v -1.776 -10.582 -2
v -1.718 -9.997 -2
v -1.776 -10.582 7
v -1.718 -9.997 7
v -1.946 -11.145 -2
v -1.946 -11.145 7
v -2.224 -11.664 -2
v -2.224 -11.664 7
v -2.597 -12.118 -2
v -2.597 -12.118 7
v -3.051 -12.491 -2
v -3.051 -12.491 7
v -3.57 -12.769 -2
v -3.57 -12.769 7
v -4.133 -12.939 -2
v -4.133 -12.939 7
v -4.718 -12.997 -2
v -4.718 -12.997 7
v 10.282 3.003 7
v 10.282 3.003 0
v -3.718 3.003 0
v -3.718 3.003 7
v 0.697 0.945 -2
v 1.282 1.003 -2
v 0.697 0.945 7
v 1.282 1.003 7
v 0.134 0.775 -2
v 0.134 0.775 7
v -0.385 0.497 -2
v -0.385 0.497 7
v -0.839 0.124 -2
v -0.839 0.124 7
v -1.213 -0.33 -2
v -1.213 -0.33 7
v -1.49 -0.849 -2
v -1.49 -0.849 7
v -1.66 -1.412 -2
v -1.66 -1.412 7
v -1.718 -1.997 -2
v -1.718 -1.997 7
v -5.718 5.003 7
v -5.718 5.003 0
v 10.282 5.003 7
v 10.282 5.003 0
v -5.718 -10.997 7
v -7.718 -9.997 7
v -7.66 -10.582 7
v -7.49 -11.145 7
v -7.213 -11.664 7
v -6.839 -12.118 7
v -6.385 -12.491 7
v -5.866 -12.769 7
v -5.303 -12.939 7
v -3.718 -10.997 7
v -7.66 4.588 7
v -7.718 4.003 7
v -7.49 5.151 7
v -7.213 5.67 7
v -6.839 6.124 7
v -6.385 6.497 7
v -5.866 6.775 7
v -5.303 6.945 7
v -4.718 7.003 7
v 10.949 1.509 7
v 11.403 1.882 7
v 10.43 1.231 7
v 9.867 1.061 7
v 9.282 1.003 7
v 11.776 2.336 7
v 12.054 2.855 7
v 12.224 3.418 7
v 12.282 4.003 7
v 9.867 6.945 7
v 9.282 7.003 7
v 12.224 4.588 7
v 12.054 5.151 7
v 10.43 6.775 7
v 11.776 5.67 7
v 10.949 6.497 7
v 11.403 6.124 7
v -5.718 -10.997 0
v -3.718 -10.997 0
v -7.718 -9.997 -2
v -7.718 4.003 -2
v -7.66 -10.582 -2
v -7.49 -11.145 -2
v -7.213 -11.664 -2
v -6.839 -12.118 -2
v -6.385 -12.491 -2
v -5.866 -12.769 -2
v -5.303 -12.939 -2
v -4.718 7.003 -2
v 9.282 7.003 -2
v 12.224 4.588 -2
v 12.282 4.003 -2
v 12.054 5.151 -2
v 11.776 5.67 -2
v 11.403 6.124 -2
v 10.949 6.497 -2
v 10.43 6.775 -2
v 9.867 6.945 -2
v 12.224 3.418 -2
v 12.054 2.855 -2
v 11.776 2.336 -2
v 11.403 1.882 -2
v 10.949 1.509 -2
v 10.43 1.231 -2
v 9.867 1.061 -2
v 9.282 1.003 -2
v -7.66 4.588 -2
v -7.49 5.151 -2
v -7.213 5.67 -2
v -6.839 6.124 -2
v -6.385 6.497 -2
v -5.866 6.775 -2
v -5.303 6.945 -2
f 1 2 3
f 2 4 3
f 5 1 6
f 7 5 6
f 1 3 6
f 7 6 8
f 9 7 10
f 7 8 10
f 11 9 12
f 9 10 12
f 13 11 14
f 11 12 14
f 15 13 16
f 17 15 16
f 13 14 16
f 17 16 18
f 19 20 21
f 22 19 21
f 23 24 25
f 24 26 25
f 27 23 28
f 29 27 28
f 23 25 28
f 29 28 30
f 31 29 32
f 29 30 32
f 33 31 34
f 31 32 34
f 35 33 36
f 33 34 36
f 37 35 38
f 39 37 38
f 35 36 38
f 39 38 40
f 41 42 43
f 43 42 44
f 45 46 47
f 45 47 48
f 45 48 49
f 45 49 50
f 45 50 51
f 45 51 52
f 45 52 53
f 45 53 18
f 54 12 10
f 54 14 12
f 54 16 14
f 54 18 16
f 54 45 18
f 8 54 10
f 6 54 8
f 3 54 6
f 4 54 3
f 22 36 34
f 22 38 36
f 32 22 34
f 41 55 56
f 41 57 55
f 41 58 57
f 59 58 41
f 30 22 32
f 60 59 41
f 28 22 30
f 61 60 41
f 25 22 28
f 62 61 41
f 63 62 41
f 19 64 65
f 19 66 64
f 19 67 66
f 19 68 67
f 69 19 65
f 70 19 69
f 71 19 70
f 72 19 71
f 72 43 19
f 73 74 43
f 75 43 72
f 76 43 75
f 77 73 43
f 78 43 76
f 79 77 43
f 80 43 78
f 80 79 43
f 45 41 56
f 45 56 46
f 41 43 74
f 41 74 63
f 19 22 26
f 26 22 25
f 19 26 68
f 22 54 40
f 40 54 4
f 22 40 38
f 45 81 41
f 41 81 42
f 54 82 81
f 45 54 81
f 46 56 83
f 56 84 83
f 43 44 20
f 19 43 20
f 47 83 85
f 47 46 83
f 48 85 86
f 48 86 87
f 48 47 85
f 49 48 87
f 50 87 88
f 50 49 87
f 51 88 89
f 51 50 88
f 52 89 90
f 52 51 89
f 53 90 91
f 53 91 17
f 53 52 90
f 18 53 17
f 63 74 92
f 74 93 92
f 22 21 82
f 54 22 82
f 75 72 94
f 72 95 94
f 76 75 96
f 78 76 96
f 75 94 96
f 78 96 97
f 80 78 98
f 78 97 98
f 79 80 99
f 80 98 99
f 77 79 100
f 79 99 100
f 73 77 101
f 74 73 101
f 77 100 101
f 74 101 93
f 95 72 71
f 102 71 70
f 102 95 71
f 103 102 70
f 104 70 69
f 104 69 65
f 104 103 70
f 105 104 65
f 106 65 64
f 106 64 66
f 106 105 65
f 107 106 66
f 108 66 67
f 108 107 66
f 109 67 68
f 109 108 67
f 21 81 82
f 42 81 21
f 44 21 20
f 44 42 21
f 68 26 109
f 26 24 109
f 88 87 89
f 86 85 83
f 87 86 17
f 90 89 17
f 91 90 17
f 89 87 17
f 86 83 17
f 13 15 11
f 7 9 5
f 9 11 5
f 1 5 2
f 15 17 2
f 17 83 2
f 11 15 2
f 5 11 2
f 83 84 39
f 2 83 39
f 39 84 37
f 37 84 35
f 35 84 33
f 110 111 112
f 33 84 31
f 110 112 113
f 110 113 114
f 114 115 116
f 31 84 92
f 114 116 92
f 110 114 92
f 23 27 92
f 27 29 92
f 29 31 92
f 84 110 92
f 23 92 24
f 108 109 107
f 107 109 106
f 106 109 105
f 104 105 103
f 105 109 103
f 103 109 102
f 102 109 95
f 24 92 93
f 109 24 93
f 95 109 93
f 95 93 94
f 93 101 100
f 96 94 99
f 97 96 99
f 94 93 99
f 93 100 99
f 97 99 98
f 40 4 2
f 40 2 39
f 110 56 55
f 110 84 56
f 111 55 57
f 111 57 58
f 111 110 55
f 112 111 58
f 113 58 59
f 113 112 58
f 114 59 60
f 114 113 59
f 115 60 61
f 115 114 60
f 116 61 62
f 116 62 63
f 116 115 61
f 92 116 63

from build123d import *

# Parameters (mm, degrees)
F1_DEPTH = 2
F2_DEPTH = 7
F3_R     = 2.99999


# Not quite as in the source:
# - a fillet or chamfer is up to 0.001 mm smaller than in the source, because OpenCascade refuses the exact size


with BuildPart() as f1:
    # F0 (on Top) → F1 (new body)
    with BuildSketch(Plane.XY):
        Polygon((10.2818826017, 7.0030450644), (-7.7181173983, 7.0030450644), (-7.7181173983, -10.9969549356), (-5.7181173983, -10.9969549356), (-5.7181173983, 5.0030450644), (10.2818826017, 5.0030450644), align=None)
        Polygon((10.2818826017, 3.0030450644), (10.2818826017, 5.0030450644), (-5.7181173983, 5.0030450644), (-5.7181173983, -10.9969549356), (-3.7181173983, -10.9969549356), (-3.7181173983, 3.0030450644), align=None)
        Polygon((10.2818826017, 1.0030450644), (10.2818826017, 3.0030450644), (-3.7181173983, 3.0030450644), (-3.7181173983, -10.9969549356), (-1.7181173983, -10.9969549356), (-1.7181173983, 1.0030450644), align=None)
        Polygon((12.2818826017, 7.0030450644), (10.2818826017, 7.0030450644), (10.2818826017, 5.0030450644), (10.2818826017, 3.0030450644), (10.2818826017, 1.0030450644), (12.2818826017, 1.0030450644), align=None)
        Polygon((-5.7181173983, -10.9969549356), (-7.7181173983, -10.9969549356), (-7.7181173983, -12.9969549356), (-1.7181173983, -12.9969549356), (-1.7181173983, -10.9969549356), (-3.7181173983, -10.9969549356), align=None)
    extrude(amount=-F1_DEPTH)

    # F0 (on Top) → F2 (join)
    with BuildSketch(Plane.XY):
        Polygon((10.2818826017, 7.0030450644), (-7.7181173983, 7.0030450644), (-7.7181173983, -10.9969549356), (-5.7181173983, -10.9969549356), (-5.7181173983, 5.0030450644), (10.2818826017, 5.0030450644), align=None)
        Polygon((10.2818826017, 1.0030450644), (10.2818826017, 3.0030450644), (-3.7181173983, 3.0030450644), (-3.7181173983, -10.9969549356), (-1.7181173983, -10.9969549356), (-1.7181173983, 1.0030450644), align=None)
        Polygon((12.2818826017, 7.0030450644), (10.2818826017, 7.0030450644), (10.2818826017, 5.0030450644), (10.2818826017, 3.0030450644), (10.2818826017, 1.0030450644), (12.2818826017, 1.0030450644), align=None)
        Polygon((-5.7181173983, -10.9969549356), (-7.7181173983, -10.9969549356), (-7.7181173983, -12.9969549356), (-1.7181173983, -12.9969549356), (-1.7181173983, -10.9969549356), (-3.7181173983, -10.9969549356), align=None)
    extrude(amount=F2_DEPTH)

    # F3 (radius 3 in the source; OpenCascade refuses exactly that, so slightly less here)
    f3_edges = [f1.edges().sort_by_distance(p)[0] for p in [
        (-1.718117, 1.003045, 2.5),
        (-7.718117, 7.003045, 2.5),
        (-7.718117, -12.996955, 2.5),
        (-1.718117, -12.996955, 2.5),
        (12.281883, 1.003045, 2.5),
        (12.281883, 7.003045, 2.5),
    ]]
    fillet(f3_edges, radius=F3_R)


solid = f1.part
